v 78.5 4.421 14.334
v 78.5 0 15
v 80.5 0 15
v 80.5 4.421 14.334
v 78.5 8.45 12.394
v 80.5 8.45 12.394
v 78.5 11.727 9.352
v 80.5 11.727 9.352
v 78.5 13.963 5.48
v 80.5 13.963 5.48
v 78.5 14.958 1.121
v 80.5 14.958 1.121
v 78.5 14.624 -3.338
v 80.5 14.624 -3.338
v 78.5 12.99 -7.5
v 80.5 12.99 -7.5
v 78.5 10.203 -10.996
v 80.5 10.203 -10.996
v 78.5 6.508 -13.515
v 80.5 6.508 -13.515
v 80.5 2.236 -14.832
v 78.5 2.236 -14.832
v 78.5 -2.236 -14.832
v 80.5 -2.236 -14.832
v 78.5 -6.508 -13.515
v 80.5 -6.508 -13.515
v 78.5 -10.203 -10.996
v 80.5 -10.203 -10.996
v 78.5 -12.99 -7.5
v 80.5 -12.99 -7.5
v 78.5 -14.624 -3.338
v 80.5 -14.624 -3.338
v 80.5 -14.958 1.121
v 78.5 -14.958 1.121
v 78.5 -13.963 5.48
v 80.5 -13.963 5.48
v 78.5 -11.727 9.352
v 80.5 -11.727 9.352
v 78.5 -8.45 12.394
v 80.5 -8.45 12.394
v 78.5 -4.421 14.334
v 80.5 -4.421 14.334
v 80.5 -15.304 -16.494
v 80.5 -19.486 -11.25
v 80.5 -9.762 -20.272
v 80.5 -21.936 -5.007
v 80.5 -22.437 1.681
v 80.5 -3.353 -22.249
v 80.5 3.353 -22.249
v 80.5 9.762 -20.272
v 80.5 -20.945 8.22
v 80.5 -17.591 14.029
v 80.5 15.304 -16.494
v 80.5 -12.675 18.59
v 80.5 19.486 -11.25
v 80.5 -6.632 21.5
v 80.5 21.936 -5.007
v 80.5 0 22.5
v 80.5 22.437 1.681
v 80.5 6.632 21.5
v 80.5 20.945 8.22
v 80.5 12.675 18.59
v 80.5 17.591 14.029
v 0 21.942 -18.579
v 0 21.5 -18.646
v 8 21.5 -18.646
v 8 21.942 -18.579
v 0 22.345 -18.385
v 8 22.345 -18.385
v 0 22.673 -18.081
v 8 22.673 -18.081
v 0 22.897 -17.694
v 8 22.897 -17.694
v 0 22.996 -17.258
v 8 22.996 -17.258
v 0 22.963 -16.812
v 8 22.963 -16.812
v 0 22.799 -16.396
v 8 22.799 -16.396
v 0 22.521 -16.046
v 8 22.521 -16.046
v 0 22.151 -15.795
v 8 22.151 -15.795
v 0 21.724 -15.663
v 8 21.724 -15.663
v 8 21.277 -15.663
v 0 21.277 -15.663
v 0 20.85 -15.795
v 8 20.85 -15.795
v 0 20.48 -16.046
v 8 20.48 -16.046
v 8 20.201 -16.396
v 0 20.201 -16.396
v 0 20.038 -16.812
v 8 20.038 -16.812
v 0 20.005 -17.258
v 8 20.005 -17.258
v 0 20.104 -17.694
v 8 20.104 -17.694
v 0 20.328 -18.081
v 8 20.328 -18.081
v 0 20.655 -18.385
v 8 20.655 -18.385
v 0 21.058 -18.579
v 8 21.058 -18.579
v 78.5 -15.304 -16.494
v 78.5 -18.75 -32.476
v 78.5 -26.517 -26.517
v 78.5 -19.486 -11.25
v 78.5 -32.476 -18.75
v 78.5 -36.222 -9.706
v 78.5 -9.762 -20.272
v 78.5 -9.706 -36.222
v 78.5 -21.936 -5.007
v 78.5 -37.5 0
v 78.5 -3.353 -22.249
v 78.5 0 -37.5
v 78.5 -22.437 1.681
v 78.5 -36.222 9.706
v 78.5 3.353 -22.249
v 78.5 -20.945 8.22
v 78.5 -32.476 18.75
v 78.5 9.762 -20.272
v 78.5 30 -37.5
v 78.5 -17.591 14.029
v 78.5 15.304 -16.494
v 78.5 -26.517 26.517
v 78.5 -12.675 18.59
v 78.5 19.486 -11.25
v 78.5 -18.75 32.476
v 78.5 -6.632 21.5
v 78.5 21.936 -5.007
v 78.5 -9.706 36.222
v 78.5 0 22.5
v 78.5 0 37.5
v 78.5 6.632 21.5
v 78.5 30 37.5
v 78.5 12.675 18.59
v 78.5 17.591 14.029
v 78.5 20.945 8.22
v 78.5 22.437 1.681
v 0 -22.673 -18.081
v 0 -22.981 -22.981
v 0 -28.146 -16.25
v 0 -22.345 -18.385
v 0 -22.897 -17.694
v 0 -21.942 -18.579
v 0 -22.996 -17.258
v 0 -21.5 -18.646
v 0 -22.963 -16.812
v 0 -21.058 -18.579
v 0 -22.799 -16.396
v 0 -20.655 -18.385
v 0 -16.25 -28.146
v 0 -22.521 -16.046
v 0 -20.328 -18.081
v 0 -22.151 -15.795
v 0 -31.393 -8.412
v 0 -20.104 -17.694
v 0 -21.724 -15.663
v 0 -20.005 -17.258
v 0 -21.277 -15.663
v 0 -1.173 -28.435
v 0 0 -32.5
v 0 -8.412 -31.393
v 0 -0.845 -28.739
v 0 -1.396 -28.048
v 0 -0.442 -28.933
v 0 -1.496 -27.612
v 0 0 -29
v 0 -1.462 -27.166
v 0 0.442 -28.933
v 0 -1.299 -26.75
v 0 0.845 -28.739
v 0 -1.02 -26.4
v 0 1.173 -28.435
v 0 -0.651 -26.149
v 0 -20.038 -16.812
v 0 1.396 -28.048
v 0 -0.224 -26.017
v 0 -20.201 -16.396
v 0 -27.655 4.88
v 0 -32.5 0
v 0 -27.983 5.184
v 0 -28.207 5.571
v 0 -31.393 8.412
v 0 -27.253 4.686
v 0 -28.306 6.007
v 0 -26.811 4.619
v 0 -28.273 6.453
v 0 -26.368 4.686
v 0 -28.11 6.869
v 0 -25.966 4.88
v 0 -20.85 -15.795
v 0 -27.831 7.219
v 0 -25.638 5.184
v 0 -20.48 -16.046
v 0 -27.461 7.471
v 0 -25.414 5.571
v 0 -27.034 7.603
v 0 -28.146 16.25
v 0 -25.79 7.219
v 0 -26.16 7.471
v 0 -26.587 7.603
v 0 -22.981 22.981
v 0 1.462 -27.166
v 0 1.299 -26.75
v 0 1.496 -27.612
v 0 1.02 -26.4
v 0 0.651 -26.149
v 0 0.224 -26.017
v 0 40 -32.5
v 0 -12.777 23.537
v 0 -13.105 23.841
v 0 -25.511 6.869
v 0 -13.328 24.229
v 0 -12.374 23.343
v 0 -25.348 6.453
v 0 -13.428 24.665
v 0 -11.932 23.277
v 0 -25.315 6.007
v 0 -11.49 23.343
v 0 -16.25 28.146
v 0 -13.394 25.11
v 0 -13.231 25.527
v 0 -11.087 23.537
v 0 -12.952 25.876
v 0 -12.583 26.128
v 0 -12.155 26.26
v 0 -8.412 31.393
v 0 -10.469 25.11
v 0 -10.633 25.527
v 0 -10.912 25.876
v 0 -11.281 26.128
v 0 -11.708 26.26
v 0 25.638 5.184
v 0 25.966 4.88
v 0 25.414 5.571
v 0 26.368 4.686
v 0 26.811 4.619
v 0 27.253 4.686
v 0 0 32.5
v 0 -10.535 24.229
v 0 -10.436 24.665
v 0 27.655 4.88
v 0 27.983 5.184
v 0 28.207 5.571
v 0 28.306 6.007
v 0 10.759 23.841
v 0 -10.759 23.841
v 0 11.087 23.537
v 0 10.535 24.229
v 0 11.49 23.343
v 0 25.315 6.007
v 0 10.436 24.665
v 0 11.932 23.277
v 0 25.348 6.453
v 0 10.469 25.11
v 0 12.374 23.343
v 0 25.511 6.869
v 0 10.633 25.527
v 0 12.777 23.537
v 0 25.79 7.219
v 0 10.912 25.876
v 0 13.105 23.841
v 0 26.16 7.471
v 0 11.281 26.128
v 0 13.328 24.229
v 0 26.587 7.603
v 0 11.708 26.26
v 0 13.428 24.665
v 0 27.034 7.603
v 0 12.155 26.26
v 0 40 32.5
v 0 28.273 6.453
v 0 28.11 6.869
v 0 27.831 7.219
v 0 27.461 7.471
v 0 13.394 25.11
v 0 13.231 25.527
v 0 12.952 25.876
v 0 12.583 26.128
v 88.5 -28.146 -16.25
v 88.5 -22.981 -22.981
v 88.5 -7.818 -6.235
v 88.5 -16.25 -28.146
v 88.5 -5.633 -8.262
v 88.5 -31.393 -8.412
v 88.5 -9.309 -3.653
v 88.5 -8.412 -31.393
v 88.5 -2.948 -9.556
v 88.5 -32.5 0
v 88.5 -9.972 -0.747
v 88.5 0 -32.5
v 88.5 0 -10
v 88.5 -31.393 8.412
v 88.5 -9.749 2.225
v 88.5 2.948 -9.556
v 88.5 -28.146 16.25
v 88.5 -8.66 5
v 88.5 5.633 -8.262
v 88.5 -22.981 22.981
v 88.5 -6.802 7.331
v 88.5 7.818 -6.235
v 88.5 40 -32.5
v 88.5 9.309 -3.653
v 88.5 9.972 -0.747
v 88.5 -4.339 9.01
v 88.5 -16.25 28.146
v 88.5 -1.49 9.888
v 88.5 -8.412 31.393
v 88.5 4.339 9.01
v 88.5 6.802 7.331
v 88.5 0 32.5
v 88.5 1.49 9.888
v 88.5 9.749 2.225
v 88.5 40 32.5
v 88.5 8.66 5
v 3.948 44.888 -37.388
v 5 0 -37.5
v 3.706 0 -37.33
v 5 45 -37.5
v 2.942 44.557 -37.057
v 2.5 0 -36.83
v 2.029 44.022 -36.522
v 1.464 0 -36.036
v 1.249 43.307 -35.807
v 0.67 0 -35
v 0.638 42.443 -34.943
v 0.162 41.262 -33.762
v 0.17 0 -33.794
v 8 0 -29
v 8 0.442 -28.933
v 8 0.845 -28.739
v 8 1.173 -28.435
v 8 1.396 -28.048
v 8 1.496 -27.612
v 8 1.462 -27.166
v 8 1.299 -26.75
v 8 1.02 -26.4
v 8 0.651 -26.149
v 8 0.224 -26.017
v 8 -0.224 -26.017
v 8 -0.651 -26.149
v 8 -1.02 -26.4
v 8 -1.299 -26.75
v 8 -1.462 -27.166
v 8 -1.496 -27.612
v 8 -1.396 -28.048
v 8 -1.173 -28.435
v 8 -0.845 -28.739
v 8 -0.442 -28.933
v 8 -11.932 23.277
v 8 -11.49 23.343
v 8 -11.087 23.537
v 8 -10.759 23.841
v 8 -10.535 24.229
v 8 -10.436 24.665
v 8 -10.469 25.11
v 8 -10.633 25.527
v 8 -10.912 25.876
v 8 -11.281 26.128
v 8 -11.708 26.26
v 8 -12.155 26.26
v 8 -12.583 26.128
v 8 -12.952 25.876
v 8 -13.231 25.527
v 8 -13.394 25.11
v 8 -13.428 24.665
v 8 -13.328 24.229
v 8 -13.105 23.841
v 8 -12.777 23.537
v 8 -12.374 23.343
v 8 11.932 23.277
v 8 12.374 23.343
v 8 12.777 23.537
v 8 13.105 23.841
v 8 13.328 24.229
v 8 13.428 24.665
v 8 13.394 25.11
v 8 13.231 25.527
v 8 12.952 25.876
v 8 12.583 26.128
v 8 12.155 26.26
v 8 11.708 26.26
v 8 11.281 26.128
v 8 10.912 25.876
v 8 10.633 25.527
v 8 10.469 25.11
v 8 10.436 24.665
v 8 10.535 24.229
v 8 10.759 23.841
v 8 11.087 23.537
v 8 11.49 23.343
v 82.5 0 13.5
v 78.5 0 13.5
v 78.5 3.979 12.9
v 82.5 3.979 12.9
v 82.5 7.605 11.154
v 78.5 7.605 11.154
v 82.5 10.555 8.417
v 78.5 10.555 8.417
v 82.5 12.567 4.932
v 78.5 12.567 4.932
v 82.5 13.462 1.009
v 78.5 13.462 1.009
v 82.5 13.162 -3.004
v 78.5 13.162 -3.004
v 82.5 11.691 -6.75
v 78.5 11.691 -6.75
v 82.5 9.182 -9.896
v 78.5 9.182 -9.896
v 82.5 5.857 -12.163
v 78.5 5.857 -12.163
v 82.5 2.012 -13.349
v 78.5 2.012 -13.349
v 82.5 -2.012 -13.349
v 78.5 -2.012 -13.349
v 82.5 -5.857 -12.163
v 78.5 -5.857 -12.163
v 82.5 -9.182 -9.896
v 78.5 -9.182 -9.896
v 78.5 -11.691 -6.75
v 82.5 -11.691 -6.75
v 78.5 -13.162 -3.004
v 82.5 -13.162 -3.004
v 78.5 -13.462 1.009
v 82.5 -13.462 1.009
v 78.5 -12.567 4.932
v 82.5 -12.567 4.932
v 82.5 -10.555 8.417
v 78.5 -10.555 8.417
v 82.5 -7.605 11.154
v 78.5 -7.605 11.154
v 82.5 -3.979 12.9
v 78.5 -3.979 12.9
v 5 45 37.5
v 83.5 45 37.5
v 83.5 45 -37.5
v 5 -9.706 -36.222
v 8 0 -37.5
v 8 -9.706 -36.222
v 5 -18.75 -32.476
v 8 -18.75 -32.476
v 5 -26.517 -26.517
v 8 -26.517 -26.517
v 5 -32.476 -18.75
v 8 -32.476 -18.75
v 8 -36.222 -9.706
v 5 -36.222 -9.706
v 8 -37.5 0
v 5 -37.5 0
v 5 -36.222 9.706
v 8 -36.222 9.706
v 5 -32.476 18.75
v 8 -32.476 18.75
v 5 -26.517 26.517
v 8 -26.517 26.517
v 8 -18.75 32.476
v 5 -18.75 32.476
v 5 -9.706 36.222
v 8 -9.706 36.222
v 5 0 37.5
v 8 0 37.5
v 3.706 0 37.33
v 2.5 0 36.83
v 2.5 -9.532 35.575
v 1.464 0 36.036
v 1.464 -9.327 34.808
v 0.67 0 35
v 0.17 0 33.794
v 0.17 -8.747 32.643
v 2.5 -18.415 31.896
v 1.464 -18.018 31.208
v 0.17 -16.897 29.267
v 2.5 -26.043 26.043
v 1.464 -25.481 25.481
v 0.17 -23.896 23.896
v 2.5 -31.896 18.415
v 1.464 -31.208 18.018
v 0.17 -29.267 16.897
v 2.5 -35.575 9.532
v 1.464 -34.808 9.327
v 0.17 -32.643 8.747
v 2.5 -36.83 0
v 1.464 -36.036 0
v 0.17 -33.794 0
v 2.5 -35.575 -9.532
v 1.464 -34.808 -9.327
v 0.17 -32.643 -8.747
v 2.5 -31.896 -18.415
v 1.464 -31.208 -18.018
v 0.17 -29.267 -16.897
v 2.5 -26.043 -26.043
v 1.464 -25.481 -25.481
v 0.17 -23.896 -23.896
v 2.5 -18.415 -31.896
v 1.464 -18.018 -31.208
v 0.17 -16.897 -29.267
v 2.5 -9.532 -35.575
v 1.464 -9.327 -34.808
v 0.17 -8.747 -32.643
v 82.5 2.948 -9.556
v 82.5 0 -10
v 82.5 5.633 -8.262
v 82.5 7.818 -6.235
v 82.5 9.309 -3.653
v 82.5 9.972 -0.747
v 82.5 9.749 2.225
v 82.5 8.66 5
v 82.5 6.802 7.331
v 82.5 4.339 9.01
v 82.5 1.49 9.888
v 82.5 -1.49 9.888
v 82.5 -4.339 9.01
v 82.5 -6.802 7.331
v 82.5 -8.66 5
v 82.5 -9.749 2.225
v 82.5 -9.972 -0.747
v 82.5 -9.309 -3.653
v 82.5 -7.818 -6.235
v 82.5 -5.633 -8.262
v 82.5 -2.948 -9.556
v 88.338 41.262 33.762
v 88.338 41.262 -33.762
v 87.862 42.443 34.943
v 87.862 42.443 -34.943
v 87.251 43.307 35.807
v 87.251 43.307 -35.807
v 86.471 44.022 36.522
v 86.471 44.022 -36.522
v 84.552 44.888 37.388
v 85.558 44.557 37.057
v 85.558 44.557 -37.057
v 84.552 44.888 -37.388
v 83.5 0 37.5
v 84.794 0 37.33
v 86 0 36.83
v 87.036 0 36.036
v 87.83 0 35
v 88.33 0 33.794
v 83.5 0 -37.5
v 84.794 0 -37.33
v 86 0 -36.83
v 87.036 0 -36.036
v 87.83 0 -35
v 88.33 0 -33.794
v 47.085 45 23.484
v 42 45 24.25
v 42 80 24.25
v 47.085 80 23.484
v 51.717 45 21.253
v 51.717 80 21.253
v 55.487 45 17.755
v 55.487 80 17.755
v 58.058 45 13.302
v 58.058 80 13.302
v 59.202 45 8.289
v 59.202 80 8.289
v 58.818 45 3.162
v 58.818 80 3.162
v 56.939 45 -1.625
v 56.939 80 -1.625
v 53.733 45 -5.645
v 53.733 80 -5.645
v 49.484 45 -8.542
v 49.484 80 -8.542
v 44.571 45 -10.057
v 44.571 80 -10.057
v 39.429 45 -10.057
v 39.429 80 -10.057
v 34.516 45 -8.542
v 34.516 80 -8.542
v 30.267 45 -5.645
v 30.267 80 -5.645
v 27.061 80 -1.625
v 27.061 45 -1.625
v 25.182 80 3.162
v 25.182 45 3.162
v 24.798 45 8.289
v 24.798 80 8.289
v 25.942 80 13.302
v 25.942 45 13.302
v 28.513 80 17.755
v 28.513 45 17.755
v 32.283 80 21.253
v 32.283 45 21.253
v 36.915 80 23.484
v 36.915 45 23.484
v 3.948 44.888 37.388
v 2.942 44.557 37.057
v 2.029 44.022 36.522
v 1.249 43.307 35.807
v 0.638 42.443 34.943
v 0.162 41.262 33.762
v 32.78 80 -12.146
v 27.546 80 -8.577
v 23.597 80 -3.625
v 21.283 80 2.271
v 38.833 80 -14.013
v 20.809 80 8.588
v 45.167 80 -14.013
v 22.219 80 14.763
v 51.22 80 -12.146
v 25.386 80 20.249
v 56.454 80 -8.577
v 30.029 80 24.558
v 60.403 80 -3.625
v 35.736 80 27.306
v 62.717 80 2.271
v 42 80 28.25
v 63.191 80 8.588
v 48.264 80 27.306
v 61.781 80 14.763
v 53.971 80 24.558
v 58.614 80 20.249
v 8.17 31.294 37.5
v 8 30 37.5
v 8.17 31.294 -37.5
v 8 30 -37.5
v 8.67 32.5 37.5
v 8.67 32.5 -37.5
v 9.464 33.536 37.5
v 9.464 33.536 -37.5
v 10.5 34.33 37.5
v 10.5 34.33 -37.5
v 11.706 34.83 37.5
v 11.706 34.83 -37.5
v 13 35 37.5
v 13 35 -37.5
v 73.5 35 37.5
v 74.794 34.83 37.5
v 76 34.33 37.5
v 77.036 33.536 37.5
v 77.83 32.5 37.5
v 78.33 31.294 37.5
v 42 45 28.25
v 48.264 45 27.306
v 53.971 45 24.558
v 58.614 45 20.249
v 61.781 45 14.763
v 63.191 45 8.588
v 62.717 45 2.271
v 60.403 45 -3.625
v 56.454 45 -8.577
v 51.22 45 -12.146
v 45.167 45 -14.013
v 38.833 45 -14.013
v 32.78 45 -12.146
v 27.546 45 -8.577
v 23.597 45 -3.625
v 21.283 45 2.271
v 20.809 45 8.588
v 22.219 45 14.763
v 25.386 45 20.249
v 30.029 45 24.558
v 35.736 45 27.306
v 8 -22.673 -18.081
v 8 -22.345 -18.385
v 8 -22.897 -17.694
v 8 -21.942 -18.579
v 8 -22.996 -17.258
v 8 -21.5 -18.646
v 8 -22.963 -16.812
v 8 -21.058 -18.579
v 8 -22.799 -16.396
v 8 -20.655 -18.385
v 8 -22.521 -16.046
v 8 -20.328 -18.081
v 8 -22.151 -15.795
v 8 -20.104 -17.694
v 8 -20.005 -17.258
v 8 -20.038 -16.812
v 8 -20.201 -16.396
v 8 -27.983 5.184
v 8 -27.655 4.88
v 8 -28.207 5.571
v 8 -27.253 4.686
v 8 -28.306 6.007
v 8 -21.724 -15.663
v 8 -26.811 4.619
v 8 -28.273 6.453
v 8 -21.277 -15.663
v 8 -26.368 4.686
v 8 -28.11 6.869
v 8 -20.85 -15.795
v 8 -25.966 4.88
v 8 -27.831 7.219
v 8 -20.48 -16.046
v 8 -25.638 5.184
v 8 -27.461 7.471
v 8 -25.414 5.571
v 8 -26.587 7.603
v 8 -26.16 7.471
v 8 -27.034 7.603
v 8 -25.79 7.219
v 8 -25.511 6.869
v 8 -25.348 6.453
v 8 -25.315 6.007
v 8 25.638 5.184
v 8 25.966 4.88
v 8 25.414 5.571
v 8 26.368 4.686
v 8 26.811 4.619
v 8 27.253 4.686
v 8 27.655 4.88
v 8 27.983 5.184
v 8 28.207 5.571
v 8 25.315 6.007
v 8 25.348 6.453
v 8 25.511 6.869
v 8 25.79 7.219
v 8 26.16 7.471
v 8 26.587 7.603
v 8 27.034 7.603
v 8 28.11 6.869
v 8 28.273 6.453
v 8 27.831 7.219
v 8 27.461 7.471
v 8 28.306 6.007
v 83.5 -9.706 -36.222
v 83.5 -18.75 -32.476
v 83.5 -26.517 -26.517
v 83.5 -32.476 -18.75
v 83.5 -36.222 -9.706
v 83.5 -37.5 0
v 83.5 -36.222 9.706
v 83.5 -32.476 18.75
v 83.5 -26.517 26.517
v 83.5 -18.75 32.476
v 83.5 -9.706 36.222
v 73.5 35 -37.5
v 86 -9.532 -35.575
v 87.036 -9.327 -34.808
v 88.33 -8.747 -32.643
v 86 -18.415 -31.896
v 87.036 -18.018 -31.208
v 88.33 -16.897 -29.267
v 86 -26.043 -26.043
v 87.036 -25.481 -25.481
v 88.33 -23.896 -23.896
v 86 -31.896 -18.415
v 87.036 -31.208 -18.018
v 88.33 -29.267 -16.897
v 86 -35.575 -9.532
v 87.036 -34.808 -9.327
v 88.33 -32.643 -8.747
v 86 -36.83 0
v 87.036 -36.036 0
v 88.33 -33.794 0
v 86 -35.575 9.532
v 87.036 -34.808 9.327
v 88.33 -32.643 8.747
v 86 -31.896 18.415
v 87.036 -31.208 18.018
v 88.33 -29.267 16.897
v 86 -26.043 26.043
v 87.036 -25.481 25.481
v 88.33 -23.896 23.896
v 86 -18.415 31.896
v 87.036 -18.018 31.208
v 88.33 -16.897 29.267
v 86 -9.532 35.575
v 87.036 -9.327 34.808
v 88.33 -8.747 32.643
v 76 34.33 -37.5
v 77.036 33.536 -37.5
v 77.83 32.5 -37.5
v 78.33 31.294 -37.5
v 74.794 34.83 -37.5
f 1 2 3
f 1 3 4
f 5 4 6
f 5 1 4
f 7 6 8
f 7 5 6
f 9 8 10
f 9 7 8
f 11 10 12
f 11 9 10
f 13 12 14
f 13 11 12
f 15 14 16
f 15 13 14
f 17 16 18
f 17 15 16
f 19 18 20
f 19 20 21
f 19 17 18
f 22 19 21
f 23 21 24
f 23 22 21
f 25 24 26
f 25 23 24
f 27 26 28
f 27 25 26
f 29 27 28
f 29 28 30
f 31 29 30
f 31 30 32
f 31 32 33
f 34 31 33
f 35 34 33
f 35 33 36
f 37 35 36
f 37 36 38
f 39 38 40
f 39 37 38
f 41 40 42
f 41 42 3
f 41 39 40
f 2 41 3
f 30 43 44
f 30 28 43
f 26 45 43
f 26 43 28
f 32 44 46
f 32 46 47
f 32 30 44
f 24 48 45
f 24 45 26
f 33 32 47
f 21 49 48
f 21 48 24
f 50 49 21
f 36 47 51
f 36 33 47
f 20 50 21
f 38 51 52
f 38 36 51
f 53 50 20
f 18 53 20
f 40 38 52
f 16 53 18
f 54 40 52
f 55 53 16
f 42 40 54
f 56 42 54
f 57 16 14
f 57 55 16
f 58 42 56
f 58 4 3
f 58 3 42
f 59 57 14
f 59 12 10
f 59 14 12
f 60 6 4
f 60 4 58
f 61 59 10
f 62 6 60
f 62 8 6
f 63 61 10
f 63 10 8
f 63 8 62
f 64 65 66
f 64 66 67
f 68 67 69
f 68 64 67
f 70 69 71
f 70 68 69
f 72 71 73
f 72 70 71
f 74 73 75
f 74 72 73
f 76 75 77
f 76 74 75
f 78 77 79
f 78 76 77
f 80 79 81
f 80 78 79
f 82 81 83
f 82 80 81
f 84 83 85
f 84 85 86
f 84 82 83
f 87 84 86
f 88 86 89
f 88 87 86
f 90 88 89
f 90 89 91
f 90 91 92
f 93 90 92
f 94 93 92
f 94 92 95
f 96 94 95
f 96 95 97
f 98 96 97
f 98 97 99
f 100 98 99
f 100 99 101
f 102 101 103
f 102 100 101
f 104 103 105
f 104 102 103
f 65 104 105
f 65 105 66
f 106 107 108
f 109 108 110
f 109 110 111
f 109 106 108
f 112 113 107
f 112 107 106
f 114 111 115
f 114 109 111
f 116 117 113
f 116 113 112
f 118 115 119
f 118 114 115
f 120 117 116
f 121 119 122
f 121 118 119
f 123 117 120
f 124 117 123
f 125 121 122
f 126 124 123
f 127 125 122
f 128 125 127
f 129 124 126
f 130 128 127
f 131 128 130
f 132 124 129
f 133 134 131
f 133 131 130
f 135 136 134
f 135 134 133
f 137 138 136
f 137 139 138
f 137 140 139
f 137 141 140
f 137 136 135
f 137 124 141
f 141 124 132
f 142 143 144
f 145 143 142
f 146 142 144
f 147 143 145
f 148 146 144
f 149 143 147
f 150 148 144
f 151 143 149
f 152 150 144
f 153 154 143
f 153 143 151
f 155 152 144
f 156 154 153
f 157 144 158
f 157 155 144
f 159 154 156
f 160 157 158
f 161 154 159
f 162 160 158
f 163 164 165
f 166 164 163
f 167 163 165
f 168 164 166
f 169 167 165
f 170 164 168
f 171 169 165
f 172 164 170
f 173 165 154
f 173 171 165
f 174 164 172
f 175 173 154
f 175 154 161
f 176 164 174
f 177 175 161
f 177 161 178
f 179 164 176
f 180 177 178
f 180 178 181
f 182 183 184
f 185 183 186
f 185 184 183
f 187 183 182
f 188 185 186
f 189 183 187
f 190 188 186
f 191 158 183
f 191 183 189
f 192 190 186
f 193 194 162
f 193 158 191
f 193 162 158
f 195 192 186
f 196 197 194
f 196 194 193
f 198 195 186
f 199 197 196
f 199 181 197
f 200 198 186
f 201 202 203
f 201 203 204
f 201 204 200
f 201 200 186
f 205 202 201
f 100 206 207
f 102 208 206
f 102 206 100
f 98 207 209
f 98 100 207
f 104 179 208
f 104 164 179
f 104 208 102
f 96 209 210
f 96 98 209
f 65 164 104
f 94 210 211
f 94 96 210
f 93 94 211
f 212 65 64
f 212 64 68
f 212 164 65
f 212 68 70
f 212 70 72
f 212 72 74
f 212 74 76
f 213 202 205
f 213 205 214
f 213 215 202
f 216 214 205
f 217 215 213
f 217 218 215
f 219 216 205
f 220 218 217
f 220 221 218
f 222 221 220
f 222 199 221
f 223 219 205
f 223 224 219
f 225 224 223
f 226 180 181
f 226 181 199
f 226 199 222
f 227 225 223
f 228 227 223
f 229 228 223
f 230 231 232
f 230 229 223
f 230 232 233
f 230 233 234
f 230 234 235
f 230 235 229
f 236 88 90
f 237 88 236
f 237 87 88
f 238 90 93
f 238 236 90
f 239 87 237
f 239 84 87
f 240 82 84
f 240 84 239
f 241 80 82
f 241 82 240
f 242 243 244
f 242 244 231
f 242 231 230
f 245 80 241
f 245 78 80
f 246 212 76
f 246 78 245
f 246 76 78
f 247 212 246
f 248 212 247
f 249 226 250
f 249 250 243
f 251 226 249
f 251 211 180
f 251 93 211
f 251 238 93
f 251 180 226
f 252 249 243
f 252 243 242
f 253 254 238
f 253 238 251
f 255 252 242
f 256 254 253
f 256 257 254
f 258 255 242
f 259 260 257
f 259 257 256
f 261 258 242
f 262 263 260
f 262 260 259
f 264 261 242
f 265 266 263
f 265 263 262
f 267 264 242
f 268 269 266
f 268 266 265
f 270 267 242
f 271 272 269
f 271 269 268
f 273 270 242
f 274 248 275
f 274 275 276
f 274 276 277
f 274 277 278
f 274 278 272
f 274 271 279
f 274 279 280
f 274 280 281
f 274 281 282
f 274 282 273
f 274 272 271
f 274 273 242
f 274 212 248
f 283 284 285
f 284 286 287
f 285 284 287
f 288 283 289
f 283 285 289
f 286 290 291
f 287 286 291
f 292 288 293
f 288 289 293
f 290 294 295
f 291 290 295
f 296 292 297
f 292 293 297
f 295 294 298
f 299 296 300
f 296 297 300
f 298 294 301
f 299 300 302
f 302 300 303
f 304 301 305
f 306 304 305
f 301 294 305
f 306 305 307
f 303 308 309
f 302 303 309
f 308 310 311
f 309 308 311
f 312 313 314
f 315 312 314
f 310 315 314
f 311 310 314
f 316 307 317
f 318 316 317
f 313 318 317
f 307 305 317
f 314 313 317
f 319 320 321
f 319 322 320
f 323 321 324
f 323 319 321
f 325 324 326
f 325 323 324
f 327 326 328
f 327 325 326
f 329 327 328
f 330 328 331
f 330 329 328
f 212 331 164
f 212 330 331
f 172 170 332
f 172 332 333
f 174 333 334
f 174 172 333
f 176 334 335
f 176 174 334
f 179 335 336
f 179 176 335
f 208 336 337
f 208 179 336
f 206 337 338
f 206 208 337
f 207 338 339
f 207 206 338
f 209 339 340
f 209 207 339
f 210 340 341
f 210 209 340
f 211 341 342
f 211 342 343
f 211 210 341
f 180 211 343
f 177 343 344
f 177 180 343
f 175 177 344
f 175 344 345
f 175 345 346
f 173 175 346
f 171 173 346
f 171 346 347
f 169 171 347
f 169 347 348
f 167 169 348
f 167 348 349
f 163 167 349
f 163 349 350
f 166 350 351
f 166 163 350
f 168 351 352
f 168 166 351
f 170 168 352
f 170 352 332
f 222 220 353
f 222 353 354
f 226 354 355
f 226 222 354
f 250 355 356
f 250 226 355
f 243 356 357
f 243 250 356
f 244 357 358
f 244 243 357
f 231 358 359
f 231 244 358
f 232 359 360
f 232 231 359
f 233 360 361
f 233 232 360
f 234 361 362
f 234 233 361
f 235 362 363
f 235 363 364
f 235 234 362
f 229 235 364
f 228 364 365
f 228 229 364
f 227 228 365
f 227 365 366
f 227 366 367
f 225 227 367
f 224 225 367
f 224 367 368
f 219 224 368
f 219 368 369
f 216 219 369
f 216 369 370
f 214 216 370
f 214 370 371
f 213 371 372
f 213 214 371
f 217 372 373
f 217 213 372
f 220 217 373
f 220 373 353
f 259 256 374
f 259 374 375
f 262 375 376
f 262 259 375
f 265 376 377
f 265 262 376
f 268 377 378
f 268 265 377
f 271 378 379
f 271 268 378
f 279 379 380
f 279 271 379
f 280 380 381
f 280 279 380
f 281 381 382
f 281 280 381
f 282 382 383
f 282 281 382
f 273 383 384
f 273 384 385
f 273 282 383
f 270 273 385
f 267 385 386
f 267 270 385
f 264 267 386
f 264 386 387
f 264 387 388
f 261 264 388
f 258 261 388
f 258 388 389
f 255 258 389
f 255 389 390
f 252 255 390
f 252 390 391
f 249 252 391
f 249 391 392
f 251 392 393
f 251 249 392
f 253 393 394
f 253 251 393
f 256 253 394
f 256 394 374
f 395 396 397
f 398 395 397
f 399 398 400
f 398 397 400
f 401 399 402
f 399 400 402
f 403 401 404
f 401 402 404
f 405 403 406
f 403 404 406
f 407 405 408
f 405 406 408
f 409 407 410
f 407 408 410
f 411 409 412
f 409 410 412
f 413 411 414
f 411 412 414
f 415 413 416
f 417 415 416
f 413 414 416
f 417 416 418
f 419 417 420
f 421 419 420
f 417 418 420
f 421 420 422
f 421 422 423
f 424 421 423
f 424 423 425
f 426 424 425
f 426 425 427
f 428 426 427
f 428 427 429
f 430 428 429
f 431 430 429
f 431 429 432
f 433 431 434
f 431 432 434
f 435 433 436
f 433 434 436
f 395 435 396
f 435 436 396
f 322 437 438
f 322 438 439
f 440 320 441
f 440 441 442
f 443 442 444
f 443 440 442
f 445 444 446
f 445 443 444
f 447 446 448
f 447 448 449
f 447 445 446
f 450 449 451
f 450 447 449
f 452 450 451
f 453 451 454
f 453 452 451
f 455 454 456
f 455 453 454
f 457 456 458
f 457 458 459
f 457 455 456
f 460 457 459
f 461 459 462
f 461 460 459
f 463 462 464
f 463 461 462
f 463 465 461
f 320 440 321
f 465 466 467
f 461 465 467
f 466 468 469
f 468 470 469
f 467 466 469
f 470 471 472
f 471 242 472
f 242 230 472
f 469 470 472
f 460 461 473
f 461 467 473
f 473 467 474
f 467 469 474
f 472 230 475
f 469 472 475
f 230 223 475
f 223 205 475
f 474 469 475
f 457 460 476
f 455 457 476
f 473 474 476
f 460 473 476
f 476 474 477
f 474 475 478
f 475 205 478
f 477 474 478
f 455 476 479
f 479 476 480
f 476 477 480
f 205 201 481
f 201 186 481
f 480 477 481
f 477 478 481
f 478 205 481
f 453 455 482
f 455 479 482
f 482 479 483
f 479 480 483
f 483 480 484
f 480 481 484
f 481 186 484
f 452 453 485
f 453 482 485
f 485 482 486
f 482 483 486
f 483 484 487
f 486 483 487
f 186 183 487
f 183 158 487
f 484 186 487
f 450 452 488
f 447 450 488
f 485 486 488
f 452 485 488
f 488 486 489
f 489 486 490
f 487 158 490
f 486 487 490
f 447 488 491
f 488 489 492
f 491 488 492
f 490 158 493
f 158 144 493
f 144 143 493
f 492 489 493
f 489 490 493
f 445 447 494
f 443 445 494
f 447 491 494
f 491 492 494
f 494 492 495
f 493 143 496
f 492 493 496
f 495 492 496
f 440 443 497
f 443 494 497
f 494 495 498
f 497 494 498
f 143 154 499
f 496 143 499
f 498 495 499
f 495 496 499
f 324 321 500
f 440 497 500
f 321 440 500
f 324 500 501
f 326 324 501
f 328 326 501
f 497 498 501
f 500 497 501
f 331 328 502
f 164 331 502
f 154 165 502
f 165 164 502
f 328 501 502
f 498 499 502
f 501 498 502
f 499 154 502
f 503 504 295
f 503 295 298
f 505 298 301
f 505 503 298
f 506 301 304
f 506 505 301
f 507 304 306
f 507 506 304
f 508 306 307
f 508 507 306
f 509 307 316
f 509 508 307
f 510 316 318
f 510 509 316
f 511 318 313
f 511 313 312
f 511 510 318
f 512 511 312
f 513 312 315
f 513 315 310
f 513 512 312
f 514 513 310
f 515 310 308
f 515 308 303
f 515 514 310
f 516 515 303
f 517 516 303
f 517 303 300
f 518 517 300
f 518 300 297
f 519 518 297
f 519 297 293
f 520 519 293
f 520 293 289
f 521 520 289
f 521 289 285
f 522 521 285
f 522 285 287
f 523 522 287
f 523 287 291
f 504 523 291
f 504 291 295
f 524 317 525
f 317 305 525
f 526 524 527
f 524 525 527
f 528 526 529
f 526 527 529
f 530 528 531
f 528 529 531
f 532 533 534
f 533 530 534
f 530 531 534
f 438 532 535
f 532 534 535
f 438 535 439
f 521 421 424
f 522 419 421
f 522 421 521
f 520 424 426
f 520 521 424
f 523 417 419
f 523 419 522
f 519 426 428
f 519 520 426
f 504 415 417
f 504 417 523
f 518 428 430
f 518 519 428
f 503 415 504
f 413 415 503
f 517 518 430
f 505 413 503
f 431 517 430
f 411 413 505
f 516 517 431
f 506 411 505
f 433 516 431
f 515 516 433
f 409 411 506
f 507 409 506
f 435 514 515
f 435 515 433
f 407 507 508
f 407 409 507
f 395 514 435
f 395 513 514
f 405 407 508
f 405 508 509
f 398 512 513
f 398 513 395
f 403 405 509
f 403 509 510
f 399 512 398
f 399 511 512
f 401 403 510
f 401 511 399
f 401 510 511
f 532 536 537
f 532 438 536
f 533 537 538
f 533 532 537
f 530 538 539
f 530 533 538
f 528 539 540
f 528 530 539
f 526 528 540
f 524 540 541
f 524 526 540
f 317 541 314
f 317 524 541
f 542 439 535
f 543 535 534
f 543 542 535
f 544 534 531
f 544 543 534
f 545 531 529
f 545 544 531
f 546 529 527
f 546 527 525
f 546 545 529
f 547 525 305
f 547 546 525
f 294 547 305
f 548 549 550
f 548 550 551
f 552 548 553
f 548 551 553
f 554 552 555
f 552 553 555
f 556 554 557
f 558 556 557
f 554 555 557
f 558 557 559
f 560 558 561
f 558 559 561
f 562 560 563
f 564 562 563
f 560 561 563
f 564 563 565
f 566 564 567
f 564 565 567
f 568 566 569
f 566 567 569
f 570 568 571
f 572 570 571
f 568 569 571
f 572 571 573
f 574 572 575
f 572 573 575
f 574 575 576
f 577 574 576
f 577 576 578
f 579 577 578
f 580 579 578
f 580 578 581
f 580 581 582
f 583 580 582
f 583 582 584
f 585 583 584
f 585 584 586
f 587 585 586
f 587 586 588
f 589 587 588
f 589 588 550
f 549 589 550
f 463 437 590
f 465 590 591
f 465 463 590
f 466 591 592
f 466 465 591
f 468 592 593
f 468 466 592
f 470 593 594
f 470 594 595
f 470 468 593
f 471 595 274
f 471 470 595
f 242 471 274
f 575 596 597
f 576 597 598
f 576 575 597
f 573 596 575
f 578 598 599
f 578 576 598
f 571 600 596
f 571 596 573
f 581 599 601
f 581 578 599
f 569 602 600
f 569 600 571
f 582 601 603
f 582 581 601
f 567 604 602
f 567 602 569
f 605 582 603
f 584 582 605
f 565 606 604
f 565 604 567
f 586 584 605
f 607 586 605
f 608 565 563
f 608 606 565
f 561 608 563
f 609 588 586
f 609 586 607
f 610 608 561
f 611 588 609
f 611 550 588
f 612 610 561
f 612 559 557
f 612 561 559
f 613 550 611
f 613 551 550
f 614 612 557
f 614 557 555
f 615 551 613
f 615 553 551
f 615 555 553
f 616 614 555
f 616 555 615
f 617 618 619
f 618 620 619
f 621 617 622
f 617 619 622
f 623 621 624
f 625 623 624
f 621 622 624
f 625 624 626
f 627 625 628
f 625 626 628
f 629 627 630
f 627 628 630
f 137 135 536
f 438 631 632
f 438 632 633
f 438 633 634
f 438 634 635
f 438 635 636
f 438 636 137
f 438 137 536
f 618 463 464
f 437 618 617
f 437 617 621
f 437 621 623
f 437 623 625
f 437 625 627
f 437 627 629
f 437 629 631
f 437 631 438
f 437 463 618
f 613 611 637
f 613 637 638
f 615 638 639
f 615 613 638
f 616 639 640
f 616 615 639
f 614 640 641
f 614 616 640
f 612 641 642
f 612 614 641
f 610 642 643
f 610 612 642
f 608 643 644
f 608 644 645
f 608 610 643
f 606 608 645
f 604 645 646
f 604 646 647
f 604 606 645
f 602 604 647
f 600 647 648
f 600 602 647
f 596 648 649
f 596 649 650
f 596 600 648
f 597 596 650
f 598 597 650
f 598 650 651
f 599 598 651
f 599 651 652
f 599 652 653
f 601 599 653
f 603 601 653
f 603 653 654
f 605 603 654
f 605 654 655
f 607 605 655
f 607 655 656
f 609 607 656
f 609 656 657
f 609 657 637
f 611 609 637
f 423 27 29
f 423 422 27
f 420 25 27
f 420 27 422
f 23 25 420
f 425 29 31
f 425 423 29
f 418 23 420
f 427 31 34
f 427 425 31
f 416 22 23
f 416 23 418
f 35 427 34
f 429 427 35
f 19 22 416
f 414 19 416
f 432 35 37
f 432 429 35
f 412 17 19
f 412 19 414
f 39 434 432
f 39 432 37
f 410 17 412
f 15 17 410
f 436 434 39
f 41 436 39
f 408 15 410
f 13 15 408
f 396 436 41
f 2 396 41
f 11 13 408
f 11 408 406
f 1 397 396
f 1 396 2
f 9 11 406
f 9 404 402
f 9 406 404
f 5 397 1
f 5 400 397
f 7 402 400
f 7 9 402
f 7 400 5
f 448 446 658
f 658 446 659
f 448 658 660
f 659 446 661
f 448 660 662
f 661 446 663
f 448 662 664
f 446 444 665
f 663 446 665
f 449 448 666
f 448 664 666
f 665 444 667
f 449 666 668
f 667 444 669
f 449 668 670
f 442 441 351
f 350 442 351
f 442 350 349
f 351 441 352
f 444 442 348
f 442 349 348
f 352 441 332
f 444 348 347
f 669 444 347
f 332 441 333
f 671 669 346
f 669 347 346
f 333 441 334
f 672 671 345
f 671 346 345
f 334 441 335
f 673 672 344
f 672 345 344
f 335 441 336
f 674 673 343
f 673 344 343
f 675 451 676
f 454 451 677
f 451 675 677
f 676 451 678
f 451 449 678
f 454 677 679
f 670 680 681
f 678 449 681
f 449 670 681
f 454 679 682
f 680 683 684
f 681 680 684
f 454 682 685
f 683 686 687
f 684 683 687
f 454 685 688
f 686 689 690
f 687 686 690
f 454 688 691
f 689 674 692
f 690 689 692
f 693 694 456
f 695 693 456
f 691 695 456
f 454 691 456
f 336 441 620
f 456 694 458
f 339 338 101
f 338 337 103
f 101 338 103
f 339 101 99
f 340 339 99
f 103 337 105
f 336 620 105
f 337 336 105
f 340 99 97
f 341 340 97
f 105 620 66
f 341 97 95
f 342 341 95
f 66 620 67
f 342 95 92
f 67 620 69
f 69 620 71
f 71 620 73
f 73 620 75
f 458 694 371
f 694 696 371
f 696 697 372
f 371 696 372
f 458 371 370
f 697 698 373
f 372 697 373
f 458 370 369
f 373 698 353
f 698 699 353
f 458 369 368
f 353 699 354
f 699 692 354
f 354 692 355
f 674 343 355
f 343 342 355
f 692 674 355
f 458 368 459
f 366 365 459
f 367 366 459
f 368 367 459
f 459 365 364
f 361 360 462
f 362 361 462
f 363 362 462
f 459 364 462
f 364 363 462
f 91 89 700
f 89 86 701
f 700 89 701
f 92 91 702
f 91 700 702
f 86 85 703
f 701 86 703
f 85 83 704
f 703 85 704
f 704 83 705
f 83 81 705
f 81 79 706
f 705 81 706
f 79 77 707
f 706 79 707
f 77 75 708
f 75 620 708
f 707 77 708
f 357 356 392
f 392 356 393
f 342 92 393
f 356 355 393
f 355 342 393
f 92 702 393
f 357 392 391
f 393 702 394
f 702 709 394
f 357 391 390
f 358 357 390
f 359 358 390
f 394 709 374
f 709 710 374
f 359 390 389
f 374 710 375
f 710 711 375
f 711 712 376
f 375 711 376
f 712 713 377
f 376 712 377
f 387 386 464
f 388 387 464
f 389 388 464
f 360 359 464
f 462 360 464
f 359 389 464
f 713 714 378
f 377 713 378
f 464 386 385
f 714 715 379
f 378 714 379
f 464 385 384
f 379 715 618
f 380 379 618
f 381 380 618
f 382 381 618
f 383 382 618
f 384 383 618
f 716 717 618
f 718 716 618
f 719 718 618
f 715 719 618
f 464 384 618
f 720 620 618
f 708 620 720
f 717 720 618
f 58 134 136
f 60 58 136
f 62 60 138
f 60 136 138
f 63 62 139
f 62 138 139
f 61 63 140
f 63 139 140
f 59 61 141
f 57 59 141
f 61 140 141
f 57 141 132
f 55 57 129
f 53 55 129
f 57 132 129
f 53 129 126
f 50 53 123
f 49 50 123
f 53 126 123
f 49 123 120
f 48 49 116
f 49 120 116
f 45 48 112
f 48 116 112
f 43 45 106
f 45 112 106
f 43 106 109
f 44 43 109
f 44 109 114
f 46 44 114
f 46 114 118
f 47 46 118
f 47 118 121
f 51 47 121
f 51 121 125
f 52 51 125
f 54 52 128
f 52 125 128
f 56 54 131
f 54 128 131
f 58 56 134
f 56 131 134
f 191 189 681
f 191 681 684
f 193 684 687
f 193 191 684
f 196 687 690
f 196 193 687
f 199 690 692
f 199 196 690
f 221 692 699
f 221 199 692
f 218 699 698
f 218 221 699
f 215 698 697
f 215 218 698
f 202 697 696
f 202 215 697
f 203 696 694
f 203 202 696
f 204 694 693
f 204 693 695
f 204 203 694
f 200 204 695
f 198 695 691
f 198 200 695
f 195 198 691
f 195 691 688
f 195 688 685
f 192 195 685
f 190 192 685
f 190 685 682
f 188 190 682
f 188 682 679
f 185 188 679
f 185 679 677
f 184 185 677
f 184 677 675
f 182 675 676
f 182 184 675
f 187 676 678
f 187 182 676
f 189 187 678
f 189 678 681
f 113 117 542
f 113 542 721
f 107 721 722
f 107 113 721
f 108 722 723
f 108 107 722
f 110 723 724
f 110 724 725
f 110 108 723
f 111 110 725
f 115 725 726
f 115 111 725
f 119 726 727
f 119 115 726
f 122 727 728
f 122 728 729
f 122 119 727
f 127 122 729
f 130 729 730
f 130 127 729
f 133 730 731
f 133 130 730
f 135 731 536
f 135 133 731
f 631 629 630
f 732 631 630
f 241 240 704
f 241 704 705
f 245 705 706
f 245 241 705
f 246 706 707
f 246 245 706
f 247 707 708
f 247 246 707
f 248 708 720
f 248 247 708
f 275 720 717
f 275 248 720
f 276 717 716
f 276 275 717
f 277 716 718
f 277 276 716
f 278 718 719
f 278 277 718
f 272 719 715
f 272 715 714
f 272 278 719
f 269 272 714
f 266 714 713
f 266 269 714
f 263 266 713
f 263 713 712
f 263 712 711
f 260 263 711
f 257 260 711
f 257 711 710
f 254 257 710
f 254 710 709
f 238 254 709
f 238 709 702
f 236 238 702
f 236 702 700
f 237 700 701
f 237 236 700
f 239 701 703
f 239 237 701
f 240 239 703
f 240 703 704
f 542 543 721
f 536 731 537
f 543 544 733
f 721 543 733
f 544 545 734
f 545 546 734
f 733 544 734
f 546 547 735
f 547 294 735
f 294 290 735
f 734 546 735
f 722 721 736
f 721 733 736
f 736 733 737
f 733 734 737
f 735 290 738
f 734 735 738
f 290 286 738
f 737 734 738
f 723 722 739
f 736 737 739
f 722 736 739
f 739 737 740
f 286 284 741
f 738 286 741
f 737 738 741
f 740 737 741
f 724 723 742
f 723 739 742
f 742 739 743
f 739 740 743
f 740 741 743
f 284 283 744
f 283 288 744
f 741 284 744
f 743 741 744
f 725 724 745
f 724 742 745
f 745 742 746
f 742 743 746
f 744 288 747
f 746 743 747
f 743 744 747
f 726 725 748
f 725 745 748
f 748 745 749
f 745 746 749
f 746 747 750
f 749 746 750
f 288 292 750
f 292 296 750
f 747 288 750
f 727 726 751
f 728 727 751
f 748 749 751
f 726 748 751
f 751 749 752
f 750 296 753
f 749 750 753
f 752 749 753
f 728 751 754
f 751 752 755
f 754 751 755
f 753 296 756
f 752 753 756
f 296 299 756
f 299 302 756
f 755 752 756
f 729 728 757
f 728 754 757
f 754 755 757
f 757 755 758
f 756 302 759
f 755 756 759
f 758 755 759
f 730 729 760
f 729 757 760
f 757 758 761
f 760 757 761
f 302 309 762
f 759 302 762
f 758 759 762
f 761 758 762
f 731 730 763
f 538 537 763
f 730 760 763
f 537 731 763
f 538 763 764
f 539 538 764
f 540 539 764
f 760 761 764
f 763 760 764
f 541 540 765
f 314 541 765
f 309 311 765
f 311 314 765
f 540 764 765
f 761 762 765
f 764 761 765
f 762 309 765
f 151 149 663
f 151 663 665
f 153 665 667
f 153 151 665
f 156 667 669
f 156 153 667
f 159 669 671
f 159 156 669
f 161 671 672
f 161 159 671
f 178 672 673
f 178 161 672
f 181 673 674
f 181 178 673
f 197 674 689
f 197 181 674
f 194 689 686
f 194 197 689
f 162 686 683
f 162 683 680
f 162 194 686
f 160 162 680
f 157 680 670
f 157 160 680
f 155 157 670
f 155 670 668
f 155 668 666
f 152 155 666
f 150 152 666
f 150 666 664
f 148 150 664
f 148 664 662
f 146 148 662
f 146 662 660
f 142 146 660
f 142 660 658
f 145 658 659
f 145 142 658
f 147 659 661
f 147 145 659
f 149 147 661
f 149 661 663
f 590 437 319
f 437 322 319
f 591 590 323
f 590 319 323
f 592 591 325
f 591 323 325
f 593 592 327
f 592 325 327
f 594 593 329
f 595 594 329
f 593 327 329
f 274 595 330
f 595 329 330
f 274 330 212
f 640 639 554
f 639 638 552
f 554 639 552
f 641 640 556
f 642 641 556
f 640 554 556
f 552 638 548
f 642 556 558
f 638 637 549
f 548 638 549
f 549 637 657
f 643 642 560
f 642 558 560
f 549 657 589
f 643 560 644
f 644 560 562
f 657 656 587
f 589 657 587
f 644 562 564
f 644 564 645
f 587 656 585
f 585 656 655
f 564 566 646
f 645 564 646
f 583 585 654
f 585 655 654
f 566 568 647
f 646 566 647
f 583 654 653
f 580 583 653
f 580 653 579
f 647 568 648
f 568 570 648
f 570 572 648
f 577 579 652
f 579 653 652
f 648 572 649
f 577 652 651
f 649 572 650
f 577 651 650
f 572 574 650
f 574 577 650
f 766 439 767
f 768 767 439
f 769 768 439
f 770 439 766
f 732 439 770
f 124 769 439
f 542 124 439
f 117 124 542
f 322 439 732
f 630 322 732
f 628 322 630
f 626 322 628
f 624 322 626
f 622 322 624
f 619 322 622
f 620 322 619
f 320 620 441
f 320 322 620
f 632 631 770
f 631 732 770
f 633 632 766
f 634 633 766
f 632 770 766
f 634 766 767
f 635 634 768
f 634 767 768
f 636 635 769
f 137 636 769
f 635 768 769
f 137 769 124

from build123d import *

# Parameters (mm, degrees)
CROQUIS1_R              = 1.5
SALIENTE_EXTRUIR1_DEPTH = 8
CROQUIS2_W              = 75
CROQUIS2_H              = 10
SALIENTE_EXTRUIR2_DEPTH = 78.5
SALIENTE_EXTRUIR4_REACH = 148.201
CROQUIS6_R              = 21.25
CROQUIS6_R_2            = 17.25
CROQUIS7_R              = 10
SALIENTE_EXTRUIR5_DEPTH = 10
CROQUIS8_R              = 22.5
CROQUIS8_R_2            = 15
CORTAR_EXTRUIR1_DEPTH   = 2
CROQUIS9_R              = 13.5
CORTAR_EXTRUIR2_DEPTH   = 4
REDONDEO1_R             = 5


with BuildPart() as part:
    # Croquis1 → Saliente-Extruir1 (new body)
    with BuildSketch(Plane(origin=(0, 0, 0), x_dir=(0, 0, -1), z_dir=(1, 0, 0))):
        with BuildLine():
            Line((-37.5, 0), (-37.5, 45))
            Line((-37.5, 45), (37.5, 45))
            Line((37.5, 45), (37.5, 0))
            ThreePointArc((37.5, 0), (0, -37.5), (-37.5, 0))
        make_face()
        with Locations((27.5, 0)):
            Circle(CROQUIS1_R, mode=Mode.SUBTRACT)
        with Locations((17.145969551, -21.500365768)):
            Circle(CROQUIS1_R, mode=Mode.SUBTRACT)
        with Locations((-6.119325684, -26.810517585)):
            Circle(CROQUIS1_R, mode=Mode.SUBTRACT)
        with Locations((-24.776643867, -11.931802826)):
            Circle(CROQUIS1_R, mode=Mode.SUBTRACT)
        with Locations((-24.776643867, 11.931802826)):
            Circle(CROQUIS1_R, mode=Mode.SUBTRACT)
        with Locations((-6.119325684, 26.810517585)):
            Circle(CROQUIS1_R, mode=Mode.SUBTRACT)
        with Locations((17.145969551, 21.500365768)):
            Circle(CROQUIS1_R, mode=Mode.SUBTRACT)
    extrude(amount=SALIENTE_EXTRUIR1_DEPTH)

    # Croquis2 → Saliente-Extruir2 (add)
    with BuildSketch(Plane(origin=(0, 0, 0), x_dir=(0, 0, -1), z_dir=(1, 0, 0))):
        with Locations((0, 40)):
            Rectangle(CROQUIS2_W, CROQUIS2_H)
    extrude(amount=SALIENTE_EXTRUIR2_DEPTH)


with BuildPart() as body_2:

    # Croquis6 → Saliente-Extruir4 (new, up to next)
    with BuildSketch(Plane(origin=(0, 80, 0), x_dir=(1, 0, 0), z_dir=(0, 1, 0)), mode=Mode.PRIVATE) as saliente_extruir4_sk1:
        with Locations(Location((42, -7, 0), (0, 0, 270))):
            Circle(CROQUIS6_R)
        with Locations(Location((42, -7, 0), (0, 0, 270))):
            Circle(CROQUIS6_R_2, mode=Mode.SUBTRACT)
    saliente_extruir4_tool1 = extrude(saliente_extruir4_sk1.sketch, amount=-SALIENTE_EXTRUIR4_REACH, mode=Mode.PRIVATE) - part.part
    add(saliente_extruir4_tool1.solids().sort_by_distance((42, 80, -13.648959))[0])


with BuildPart() as part_1:
    add(part.part)

    # Croquis7 → Saliente-Extruir5 (add)
    with BuildSketch(Plane(origin=(78.5, 0, 0), x_dir=(0, 0, -1), z_dir=(1, 0, 0))):
        with BuildLine():
            Line((-37.5, 0), (-37.5, 45))
            Line((-37.5, 45), (37.5, 45))
            Line((37.5, 45), (37.5, 0))
            ThreePointArc((37.5, 0), (0, -37.5), (-37.5, 0))
        make_face()
        Circle(CROQUIS7_R, mode=Mode.SUBTRACT)
    extrude(amount=SALIENTE_EXTRUIR5_DEPTH)

    # Croquis8 → Cortar-Extruir1 (cut)
    with BuildSketch(Plane.ZY.offset(-78.5)):
        Circle(CROQUIS8_R)
        Circle(CROQUIS8_R_2, mode=Mode.SUBTRACT)
    extrude(amount=-CORTAR_EXTRUIR1_DEPTH, mode=Mode.SUBTRACT)

    # Croquis9 → Cortar-Extruir2 (cut)
    with BuildSketch(Plane.ZY.offset(-78.5)):
        Circle(CROQUIS9_R)
    extrude(amount=-CORTAR_EXTRUIR2_DEPTH, mode=Mode.SUBTRACT)

    # Redondeo1
    redondeo1_edges = [part_1.edges().sort_by_distance(p)[0] for p in [
        (8, 35, 0),
        (78.5, 35, 0),
        (0, 22.5, 37.5),
        (0, 45, 0),
        (0, 22.5, -37.5),
        (0, -37.5, 0),
        (88.5, -37.5, 0),
        (88.5, 22.5, -37.5),
        (88.5, 45, 0),
        (88.5, 22.5, 37.5),
    ]]
    fillet(redondeo1_edges, radius=REDONDEO1_R)


solid = Compound([body_2.part, part_1.part])
